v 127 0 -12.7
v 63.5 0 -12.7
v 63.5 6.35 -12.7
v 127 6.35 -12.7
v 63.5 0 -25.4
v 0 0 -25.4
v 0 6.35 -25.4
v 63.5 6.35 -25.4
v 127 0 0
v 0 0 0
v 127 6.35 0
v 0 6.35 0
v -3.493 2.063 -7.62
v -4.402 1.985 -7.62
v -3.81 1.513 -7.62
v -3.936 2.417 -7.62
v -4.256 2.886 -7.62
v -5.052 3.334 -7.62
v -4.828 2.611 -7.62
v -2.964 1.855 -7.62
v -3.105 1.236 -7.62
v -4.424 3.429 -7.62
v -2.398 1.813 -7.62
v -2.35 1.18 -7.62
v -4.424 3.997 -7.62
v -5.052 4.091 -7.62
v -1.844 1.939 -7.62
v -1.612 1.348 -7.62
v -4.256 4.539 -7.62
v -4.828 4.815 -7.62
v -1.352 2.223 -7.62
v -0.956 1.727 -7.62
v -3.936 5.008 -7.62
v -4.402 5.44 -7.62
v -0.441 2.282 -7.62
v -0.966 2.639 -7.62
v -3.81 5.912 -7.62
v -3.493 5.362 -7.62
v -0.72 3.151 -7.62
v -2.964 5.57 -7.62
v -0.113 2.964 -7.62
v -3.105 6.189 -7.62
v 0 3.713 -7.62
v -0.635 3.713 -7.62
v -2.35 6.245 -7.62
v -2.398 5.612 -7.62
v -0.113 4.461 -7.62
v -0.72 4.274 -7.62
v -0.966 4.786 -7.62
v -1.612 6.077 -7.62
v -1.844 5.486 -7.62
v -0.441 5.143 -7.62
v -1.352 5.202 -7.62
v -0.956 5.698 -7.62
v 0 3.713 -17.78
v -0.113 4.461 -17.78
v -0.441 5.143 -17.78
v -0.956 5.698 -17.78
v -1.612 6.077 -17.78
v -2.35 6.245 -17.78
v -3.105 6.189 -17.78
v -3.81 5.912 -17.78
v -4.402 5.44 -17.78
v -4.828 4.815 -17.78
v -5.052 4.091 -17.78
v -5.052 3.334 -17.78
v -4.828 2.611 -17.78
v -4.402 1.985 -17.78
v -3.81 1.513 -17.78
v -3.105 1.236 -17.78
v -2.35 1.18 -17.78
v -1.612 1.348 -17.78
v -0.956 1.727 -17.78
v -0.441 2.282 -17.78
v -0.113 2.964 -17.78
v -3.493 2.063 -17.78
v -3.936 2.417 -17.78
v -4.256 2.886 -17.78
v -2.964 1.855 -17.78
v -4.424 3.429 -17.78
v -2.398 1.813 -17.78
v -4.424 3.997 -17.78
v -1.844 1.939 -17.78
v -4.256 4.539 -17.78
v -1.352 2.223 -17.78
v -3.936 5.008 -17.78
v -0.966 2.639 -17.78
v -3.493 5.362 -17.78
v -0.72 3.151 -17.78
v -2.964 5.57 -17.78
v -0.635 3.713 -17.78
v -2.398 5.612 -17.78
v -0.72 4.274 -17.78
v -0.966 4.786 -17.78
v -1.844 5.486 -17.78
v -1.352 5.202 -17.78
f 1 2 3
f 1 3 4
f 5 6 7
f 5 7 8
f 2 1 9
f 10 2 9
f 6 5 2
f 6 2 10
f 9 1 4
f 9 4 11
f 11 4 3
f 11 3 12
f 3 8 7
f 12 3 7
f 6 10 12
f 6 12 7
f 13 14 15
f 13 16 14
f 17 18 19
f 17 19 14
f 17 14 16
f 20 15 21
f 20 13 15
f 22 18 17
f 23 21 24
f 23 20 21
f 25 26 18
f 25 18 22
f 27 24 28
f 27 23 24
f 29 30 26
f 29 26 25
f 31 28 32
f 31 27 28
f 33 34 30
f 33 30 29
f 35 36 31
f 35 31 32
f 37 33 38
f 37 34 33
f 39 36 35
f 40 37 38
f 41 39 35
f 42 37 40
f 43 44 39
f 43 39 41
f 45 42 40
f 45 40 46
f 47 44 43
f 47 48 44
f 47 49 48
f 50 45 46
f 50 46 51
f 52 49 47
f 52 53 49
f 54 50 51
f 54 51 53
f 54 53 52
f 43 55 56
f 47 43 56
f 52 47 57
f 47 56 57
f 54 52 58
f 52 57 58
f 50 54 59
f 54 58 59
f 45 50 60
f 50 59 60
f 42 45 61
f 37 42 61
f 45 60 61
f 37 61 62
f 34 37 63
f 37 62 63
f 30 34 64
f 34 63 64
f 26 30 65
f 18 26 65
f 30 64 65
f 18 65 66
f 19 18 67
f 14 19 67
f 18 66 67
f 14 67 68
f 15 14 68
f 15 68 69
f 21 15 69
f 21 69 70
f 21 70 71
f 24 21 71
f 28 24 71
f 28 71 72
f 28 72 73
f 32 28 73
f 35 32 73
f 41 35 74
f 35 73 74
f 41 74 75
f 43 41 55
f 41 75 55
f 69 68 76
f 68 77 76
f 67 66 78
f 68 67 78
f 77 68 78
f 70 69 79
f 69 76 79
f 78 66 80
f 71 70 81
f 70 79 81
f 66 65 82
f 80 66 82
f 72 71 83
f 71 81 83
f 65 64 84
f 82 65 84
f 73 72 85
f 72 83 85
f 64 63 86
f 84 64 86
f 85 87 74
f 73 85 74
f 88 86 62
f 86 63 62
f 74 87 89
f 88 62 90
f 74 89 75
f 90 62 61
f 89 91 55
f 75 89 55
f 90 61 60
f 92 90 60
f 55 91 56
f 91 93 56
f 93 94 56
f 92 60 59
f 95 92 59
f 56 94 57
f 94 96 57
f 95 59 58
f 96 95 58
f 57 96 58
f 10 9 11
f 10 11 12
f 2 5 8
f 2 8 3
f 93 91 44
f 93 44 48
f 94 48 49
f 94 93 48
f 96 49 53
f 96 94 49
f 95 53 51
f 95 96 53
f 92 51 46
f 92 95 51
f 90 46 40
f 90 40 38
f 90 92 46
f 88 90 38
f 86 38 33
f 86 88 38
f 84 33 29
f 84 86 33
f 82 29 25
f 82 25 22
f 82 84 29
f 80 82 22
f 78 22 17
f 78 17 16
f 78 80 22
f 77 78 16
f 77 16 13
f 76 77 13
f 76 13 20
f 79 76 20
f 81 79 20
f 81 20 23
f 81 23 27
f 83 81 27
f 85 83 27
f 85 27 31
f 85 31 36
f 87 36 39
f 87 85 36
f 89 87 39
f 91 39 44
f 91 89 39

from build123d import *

# Parameters (mm, degrees)
BOSS_EXTRUDE1_DEPTH      = 6.35
BOSS_EXTRUDE2_DEPTH      = 5.08
BOSS_EXTRUDE2_DEPTH_BACK = 5.08
SKETCH2_R                = 2.54
SKETCH2_R_2              = 1.905


with BuildPart() as part:
    # Sketch1 → Boss-Extrude1 (new body)
    with BuildSketch(Plane(origin=(0, 0, 0), x_dir=(1, 0, 0), z_dir=(0, 1, 0))):
        Polygon((63.5, 25.4), (63.5, 12.7), (127, 12.7), (127, 0), (0, 0), (0, 25.4), align=None)
    extrude(amount=BOSS_EXTRUDE1_DEPTH)


with BuildPart() as body_2:
    # Sketch2 → Boss-Extrude2 (new, two sides: drawn at the far end of the back side and taken through both)
    with BuildSketch(Plane.XY.offset(-12.7).offset(-BOSS_EXTRUDE2_DEPTH_BACK)):
        with Locations((-2.54, 3.712588247)):
            Circle(SKETCH2_R)
        with Locations((-2.54, 3.712588247)):
            Circle(SKETCH2_R_2, mode=Mode.SUBTRACT)
    extrude(amount=BOSS_EXTRUDE2_DEPTH + BOSS_EXTRUDE2_DEPTH_BACK)


solid = Compound([part.part, body_2.part])
